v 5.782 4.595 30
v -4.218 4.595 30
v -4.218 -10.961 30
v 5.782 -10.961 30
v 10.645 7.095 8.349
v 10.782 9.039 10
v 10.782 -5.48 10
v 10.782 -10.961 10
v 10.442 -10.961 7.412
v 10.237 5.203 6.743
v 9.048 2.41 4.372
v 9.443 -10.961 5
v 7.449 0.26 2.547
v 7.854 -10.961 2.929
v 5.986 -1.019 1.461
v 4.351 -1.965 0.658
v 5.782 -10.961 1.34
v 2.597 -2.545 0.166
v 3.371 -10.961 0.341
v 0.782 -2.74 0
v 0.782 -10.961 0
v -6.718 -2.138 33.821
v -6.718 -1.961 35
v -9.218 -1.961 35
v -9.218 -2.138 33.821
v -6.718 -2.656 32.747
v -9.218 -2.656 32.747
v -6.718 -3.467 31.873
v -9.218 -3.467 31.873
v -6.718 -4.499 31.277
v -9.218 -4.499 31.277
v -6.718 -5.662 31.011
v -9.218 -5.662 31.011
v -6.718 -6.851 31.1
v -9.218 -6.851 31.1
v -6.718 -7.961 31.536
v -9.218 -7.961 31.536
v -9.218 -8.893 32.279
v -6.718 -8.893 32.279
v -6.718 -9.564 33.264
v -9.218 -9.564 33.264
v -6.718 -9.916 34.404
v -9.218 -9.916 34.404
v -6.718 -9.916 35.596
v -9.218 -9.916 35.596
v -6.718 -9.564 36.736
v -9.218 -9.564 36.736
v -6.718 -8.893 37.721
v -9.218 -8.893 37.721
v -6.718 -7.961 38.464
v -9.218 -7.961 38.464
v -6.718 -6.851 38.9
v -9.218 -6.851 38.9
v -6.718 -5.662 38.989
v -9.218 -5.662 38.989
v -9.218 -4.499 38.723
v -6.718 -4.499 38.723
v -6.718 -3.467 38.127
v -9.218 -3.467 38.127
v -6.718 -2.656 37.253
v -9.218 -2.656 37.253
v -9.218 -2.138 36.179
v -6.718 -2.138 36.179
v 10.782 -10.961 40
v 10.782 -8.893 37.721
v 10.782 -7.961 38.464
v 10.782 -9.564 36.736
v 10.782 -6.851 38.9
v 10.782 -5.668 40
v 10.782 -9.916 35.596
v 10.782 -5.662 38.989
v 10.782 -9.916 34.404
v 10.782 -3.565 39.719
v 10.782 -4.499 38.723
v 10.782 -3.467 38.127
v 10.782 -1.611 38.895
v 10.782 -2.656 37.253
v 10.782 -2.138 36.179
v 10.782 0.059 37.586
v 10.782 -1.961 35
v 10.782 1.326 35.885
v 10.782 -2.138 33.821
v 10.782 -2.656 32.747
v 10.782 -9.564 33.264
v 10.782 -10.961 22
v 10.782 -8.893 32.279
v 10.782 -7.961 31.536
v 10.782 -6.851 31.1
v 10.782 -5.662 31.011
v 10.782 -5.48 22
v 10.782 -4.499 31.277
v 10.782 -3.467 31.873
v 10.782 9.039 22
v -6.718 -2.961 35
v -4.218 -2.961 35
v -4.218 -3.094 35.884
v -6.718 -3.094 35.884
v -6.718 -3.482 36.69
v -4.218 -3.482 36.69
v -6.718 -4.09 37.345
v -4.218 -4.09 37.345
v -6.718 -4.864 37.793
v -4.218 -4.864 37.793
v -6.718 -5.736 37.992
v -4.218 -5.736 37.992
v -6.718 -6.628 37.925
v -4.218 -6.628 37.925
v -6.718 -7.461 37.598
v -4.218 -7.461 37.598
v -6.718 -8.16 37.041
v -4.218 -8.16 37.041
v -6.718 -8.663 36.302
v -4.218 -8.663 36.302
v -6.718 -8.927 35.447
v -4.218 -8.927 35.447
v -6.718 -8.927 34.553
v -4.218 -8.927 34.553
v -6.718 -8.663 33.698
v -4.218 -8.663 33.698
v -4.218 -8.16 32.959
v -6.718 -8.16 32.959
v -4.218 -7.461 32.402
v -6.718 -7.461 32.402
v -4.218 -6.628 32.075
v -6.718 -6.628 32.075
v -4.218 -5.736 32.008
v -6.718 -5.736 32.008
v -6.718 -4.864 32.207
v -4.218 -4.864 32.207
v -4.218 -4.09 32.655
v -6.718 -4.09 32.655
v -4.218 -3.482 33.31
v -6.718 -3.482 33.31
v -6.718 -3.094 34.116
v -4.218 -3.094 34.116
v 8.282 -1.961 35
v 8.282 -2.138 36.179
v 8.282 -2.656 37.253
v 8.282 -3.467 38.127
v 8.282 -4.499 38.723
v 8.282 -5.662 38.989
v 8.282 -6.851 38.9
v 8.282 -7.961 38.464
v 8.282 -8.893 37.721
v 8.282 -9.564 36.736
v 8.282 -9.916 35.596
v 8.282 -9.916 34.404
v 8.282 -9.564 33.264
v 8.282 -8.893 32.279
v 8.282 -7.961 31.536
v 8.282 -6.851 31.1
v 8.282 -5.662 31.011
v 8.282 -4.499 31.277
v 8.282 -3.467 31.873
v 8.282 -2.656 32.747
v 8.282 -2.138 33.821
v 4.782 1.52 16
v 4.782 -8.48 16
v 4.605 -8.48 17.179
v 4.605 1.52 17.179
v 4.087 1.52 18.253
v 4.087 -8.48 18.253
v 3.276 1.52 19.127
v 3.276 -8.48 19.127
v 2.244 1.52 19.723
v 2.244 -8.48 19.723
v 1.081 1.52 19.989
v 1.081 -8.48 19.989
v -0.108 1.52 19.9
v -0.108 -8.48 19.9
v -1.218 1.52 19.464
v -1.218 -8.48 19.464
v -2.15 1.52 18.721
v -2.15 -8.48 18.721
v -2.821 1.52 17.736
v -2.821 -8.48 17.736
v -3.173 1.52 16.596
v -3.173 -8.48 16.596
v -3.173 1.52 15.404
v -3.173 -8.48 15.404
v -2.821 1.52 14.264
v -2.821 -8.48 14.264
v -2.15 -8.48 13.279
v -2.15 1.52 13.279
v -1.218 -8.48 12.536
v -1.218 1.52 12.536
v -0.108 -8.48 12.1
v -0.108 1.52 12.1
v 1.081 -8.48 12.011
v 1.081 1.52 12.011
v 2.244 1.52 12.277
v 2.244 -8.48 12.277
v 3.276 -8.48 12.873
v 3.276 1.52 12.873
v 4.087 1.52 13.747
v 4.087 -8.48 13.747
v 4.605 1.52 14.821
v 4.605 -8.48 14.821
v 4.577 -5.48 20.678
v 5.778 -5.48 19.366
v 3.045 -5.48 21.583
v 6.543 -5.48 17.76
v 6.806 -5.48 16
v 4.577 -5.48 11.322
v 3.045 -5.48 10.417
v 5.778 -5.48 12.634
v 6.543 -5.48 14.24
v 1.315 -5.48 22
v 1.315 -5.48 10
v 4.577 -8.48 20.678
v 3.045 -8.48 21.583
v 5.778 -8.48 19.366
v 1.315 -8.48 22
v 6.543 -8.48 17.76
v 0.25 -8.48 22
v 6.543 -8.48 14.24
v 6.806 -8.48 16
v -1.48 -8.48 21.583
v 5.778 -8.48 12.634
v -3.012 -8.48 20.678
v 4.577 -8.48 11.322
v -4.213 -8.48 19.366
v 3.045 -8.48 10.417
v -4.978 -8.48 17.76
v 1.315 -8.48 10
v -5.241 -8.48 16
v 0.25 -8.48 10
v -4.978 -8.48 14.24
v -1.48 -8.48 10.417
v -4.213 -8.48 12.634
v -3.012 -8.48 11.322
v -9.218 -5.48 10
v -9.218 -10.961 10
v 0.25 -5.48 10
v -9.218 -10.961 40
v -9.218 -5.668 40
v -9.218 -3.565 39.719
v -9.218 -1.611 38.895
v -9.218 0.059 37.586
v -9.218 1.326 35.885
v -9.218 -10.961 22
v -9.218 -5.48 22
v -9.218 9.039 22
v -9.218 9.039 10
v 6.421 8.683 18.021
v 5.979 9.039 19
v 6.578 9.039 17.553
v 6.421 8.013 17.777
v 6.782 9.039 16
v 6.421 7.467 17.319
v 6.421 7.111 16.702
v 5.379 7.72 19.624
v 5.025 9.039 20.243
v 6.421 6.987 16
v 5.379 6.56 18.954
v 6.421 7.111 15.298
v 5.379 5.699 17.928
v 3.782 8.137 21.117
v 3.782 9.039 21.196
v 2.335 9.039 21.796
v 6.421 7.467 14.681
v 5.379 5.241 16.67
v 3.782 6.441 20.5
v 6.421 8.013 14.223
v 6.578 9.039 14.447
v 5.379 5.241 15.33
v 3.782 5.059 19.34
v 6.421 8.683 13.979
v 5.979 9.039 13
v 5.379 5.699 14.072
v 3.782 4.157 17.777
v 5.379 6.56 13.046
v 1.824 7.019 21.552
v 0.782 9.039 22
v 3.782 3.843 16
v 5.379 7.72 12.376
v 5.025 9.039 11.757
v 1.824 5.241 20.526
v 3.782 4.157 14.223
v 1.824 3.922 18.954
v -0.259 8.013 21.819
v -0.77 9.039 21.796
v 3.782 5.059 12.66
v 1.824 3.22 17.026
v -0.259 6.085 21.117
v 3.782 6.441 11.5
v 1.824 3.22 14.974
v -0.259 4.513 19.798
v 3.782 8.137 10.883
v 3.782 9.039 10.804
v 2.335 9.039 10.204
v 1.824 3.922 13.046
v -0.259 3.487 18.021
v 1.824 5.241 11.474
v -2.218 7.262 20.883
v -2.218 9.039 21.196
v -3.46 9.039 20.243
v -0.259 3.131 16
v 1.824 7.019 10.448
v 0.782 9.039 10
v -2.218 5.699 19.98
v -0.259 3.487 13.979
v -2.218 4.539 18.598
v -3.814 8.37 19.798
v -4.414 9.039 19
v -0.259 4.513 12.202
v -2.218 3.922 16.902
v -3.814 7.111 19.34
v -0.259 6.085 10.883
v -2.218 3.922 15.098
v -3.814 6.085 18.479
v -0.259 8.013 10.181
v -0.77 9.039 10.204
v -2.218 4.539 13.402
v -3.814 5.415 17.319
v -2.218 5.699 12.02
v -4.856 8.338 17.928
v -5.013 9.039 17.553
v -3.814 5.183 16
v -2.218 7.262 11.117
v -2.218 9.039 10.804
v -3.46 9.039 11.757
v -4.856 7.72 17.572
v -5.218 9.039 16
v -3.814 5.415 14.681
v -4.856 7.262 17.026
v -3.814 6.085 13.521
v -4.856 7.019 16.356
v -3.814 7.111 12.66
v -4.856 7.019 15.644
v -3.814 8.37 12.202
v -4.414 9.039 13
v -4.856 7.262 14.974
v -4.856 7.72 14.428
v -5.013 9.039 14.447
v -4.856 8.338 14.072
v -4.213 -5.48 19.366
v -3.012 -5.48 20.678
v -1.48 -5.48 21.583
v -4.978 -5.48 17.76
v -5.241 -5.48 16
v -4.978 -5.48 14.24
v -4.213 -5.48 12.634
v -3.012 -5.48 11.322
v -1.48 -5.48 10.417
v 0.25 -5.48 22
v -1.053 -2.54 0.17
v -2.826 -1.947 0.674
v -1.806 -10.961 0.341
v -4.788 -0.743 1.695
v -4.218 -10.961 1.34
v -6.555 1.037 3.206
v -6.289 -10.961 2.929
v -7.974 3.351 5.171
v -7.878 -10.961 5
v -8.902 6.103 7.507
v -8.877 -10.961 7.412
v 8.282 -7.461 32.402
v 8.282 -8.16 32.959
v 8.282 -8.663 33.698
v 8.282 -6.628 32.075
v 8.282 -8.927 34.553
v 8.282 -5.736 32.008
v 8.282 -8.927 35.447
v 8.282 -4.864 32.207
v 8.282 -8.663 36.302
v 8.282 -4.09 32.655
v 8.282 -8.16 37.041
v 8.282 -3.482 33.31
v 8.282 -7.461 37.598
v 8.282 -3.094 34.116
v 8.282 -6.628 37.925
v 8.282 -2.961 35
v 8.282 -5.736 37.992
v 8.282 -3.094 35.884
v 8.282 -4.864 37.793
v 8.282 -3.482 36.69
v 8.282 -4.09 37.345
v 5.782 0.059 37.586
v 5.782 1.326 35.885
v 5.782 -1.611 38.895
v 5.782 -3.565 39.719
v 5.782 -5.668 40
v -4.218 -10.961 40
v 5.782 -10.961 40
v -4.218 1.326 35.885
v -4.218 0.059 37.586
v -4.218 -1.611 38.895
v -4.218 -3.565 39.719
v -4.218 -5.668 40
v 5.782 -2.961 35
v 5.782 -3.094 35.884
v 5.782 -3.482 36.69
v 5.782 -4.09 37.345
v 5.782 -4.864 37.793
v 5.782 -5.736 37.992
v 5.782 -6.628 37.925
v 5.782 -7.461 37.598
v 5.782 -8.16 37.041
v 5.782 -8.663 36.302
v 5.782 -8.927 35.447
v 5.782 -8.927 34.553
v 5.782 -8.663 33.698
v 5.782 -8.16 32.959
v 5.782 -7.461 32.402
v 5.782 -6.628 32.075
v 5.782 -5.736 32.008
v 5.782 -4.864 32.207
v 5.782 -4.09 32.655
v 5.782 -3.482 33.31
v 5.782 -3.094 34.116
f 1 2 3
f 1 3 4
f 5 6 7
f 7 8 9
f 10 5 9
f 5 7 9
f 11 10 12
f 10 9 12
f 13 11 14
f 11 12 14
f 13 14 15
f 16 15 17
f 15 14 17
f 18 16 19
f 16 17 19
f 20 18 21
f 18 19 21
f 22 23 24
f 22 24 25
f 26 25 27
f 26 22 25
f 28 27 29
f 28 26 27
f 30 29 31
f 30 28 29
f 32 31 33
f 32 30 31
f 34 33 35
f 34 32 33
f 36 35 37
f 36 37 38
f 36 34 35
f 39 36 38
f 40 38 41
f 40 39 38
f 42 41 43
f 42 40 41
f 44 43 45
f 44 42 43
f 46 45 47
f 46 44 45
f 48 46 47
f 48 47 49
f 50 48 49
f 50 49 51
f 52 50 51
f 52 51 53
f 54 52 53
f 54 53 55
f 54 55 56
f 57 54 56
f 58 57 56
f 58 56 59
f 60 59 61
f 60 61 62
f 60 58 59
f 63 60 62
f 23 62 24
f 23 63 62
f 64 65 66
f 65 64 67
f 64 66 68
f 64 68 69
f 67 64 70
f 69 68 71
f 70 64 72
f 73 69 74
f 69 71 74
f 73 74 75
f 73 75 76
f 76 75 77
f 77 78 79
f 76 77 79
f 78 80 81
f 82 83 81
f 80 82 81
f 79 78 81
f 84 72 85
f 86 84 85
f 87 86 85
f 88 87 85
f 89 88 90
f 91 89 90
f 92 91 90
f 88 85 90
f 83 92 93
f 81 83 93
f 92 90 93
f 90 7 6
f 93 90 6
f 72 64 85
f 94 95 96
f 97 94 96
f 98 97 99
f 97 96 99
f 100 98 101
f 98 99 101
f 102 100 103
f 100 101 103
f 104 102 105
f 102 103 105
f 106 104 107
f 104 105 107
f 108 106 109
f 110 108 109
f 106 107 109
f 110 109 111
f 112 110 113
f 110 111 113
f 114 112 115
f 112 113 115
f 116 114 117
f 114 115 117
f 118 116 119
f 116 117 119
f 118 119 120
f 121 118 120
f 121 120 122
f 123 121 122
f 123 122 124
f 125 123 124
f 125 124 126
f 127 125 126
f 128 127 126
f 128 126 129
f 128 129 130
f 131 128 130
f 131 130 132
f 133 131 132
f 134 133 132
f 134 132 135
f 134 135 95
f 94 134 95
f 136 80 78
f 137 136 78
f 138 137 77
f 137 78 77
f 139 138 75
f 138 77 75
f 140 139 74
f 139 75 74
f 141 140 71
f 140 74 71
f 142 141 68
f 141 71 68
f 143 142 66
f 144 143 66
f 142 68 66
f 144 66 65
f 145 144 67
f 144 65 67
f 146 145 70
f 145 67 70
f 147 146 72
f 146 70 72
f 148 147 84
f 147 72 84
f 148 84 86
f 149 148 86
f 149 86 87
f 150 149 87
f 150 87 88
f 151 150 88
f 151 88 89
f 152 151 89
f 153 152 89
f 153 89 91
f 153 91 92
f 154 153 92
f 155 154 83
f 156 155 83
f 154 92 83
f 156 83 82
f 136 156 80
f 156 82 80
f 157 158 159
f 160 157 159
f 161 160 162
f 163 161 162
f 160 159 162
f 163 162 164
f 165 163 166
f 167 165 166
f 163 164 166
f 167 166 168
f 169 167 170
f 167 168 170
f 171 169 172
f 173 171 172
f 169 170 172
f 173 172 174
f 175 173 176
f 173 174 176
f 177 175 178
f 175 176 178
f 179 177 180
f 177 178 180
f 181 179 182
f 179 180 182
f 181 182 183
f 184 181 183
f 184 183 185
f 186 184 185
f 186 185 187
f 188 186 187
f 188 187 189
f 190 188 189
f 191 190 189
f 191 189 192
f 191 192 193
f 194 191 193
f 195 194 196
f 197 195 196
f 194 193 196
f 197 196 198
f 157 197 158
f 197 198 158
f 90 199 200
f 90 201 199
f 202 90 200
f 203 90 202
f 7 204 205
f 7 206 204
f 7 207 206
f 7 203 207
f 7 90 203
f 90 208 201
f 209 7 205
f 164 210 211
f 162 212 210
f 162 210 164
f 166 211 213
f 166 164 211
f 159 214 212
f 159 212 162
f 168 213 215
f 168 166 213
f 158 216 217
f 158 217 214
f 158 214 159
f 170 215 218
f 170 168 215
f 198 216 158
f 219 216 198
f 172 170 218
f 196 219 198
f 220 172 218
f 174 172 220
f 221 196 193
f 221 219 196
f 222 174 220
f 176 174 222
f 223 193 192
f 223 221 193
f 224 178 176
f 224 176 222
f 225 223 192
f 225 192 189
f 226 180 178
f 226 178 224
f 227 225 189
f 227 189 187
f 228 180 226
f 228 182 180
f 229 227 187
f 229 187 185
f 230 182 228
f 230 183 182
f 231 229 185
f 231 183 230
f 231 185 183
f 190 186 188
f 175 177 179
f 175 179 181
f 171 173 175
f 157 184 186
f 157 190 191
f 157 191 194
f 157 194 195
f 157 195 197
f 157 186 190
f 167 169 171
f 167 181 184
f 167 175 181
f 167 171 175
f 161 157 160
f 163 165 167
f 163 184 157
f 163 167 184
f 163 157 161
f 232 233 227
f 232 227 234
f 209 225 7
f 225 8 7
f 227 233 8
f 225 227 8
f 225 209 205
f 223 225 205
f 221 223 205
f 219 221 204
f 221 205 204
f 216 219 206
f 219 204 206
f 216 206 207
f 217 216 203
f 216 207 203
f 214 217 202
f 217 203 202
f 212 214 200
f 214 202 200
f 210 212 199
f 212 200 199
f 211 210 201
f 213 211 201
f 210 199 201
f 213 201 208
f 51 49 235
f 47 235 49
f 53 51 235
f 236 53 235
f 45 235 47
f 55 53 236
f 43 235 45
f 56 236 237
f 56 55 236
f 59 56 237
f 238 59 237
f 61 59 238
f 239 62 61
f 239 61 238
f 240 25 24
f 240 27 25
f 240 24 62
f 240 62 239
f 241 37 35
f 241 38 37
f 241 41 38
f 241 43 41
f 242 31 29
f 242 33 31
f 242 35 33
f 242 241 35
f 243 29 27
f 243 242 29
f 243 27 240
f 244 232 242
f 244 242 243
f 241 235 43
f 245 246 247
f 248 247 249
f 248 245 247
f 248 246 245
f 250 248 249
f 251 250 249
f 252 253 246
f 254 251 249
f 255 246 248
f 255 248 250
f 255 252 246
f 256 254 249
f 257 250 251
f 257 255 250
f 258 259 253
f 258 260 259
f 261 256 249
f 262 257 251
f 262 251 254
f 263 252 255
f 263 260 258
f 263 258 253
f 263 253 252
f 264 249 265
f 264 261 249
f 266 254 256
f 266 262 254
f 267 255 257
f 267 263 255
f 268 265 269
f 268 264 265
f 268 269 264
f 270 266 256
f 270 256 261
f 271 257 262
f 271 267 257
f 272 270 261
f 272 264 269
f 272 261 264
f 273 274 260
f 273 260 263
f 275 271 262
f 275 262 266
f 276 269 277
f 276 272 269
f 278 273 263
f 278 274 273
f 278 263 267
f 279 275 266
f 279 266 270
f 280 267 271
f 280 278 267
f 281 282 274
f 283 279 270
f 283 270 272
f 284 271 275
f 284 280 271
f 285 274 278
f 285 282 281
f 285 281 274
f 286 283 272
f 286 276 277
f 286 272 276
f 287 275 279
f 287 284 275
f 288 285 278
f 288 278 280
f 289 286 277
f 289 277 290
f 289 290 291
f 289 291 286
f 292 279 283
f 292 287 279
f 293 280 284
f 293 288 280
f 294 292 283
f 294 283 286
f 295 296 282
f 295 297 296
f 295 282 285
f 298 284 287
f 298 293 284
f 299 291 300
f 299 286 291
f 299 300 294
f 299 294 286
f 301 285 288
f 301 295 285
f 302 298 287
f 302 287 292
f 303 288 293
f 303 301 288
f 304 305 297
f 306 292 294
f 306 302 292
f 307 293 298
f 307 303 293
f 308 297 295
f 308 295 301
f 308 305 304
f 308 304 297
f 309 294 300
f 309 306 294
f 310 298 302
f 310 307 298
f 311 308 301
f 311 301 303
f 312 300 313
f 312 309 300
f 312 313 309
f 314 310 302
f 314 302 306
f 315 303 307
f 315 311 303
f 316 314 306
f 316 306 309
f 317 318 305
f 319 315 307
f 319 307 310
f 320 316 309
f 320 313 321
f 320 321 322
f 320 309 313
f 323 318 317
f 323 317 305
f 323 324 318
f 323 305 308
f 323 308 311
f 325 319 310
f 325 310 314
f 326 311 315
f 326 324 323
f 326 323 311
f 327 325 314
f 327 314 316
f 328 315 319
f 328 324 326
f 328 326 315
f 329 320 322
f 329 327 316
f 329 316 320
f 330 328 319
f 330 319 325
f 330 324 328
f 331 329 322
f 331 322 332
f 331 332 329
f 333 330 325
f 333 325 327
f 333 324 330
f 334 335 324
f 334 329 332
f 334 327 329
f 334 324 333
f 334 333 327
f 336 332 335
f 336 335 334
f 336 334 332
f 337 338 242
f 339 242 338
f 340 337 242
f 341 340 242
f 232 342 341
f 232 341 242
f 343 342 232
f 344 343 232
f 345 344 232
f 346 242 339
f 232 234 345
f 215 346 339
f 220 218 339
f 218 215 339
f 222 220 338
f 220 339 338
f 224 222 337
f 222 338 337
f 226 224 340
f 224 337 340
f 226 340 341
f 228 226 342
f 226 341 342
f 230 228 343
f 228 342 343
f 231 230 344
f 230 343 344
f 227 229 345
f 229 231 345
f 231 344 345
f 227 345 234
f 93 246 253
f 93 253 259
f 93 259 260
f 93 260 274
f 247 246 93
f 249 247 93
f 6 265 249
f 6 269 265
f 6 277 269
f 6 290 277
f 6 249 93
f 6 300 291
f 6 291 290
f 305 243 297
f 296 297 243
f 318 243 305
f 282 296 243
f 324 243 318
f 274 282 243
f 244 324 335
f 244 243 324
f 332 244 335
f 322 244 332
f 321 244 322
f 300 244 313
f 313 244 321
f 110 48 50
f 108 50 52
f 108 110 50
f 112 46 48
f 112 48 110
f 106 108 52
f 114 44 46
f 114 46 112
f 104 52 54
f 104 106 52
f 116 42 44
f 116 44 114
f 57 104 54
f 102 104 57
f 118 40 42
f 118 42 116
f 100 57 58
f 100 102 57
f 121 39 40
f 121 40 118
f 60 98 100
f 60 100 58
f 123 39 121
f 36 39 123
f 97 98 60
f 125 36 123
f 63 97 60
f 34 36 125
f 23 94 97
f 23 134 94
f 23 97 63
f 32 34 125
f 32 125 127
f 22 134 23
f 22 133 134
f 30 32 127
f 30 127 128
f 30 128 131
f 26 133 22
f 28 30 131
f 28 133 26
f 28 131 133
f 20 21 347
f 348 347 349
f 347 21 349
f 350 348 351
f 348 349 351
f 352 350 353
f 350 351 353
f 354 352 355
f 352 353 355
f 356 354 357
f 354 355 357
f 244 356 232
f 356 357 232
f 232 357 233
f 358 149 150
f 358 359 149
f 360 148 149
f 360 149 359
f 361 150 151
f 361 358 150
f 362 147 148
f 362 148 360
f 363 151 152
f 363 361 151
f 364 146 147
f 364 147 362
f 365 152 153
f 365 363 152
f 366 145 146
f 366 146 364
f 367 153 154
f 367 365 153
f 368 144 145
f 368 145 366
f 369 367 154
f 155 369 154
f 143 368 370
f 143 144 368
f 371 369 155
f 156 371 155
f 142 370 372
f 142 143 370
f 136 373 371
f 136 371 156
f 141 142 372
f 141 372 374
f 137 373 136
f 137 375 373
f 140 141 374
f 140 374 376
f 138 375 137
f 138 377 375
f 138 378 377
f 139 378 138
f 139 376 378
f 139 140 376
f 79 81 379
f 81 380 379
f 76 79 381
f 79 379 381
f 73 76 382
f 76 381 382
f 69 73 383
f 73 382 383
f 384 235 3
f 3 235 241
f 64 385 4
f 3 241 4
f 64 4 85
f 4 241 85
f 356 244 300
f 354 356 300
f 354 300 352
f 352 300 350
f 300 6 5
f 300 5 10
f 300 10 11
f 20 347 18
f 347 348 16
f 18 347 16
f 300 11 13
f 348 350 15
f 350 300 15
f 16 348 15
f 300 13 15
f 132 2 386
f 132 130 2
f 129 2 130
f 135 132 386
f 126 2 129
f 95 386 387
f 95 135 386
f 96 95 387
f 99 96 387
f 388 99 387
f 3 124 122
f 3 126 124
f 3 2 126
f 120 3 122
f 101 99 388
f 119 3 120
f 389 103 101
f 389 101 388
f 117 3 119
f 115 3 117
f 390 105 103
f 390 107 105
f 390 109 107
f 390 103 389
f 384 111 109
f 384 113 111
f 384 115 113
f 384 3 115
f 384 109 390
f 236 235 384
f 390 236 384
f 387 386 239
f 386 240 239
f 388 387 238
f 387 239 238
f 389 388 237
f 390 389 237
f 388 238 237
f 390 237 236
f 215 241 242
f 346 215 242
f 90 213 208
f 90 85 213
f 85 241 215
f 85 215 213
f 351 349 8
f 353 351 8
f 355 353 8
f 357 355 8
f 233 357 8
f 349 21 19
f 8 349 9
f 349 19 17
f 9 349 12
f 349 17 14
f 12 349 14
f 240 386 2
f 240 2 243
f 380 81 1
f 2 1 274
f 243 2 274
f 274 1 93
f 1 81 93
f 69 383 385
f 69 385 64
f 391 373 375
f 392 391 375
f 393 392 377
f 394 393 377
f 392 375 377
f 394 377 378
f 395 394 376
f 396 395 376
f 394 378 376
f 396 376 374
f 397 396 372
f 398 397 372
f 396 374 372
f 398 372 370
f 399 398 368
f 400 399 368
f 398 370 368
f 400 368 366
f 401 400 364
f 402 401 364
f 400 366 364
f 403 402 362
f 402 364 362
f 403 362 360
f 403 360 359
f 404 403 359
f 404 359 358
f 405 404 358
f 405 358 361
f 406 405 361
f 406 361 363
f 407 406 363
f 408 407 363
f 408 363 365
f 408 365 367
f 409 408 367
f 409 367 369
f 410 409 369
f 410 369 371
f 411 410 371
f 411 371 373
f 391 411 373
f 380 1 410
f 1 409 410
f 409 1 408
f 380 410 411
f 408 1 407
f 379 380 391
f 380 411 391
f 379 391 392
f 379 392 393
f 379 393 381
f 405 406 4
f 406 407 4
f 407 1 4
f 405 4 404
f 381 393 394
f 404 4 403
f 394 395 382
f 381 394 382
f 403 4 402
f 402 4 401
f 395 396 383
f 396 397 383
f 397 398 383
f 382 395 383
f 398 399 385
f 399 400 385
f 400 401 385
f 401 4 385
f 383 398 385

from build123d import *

# Parameters (mm, degrees)
SKETCH5_W           = 20
SKETCH5_H           = 20
BOSS_EXTRUDE1_DEPTH = 40
SKETCH7_W           = 12
SKETCH7_H           = 5.480254557
CUT_EXTRUDE3_DEPTH  = 20
SKETCH8_W           = 10
SKETCH8_H           = 10
CUT_EXTRUDE5_DEPTH  = 20
SKETCH12_R          = 3
CUT_EXTRUDE9_DEPTH  = 20
SKETCH16_R          = 4
CUT_EXTRUDE10_DEPTH = 2.5
CUT_EXTRUDE11_START = -2.5
SKETCH17_R          = 4
CUT_EXTRUDE11_DEPTH = 2.5
FILLET8_R           = 8
SKETCH18_R          = 6.023611462
BOSS_EXTRUDE2_DEPTH = 3
SKETCH19_R          = 4
CUT_EXTRUDE12_DEPTH = 10


with BuildPart() as part:
    # Sketch5 → Boss-Extrude1 (new body)
    with BuildSketch(Plane.XY):
        with Locations((0.782482396, -0.960509114)):
            Rectangle(SKETCH5_W, SKETCH5_H)
    extrude(amount=BOSS_EXTRUDE1_DEPTH)

    # Sketch7 → Cut-Extrude3 (cut)
    with BuildSketch(Plane(origin=(10.782482396, 0, 0), x_dir=(0, 0, -1), z_dir=(1, 0, 0))):
        Polygon((-40, 9.039490886), (-40, -0.960509114), (-22, 9.039490886), align=None)
        with Locations((-16, -8.220381835)):
            Rectangle(SKETCH7_W, SKETCH7_H)
        Polygon((-10, 9.039490886), (0, -2.740127279), (0, 9.039490886), align=None)
    extrude(amount=-CUT_EXTRUDE3_DEPTH, mode=Mode.SUBTRACT)

    # Sketch8 → Cut-Extrude5 (cut)
    with BuildSketch(Plane.XZ.offset(10.960509114)):
        with BuildLine():
            Line((-9.217517604, 0), (0.78248238, 0))
            ThreePointArc((0.78248238, 0), (-6.288585421, 2.928932194), (-9.217517604, 10))
            Line((-9.217517604, 10), (-9.217517604, 0))
        make_face()
        with BuildLine():
            Line((10.782482396, 0), (10.782482396, 10))
            ThreePointArc((10.782482396, 10), (7.853550202, 2.928932182), (0.78248238, 0))
            Line((0.78248238, 0), (10.782482396, 0))
        make_face()
        with Locations((0.782482396, 35)):
            Rectangle(SKETCH8_W, SKETCH8_H)
    extrude(amount=-CUT_EXTRUDE5_DEPTH, mode=Mode.SUBTRACT)

    # Sketch10 → Cut-Revolve2 (revolve, cut)
    with BuildSketch(Plane(origin=(0, 9.039490886, 0), x_dir=(1, 0, 0), z_dir=(0, 1, 0))):
        with BuildLine():
            Line((-5.217517604, -16), (6.782482396, -16))
            ThreePointArc((6.782482396, -16), (0.782482396, -22), (-5.217517604, -16))
        make_face()
    revolve(axis=Axis((-5.217517604, 9.039490886, 16), (1, 0, 0)), mode=Mode.SUBTRACT)

    # Sketch12 → Cut-Extrude9 (cut)
    with BuildSketch(Plane(origin=(10.782482396, 0, 0), x_dir=(0, 0, -1), z_dir=(1, 0, 0))):
        with Locations(Location((-35, -5.960509114, 0), (0, 0, 90))):
            Circle(SKETCH12_R)
    extrude(amount=-CUT_EXTRUDE9_DEPTH, mode=Mode.SUBTRACT)

    # Sketch16 → Cut-Extrude10 (cut)
    with BuildSketch(Plane(origin=(10.782482396, 0, 0), x_dir=(0, 0, -1), z_dir=(1, 0, 0))):
        with Locations(Location((-35, -5.960509114, 0), (0, 0, 90))):
            Circle(SKETCH16_R)
    extrude(amount=-CUT_EXTRUDE10_DEPTH, mode=Mode.SUBTRACT)

    # Sketch17 → Cut-Extrude11 (cut)
    with BuildSketch(Plane.ZY.offset(9.217517604).offset(CUT_EXTRUDE11_START)):
        with Locations(Location((35, -5.960509114, 0), (0, 0, 90))):
            Circle(SKETCH17_R)
    extrude(amount=CUT_EXTRUDE11_DEPTH, mode=Mode.SUBTRACT)

    # Fillet8
    fillet8_edges = [part.edges().sort_by_distance(p)[0] for p in [
        (-6.717517604, -0.960509114, 40),
        (8.282482396, -0.960509114, 40),
    ]]
    fillet(fillet8_edges, radius=FILLET8_R)

    # Sketch18 → Boss-Extrude2 (add)
    with BuildSketch(Plane(origin=(0, -5.480254557, 0), x_dir=(-1, 0, 0), z_dir=(0, -1, 0))):
        with Locations((-0.782482396, -16)):
            Circle(SKETCH18_R)
    extrude(amount=BOSS_EXTRUDE2_DEPTH)

    # Sketch19 → Cut-Extrude12 (cut)
    with BuildSketch(Plane(origin=(0, -8.480254557, 0), x_dir=(-1, 0, 0), z_dir=(0, -1, 0))):
        with Locations(Location((-0.782482396, -16, 0), (0, 0, 180))):
            Circle(SKETCH19_R)
    extrude(amount=-CUT_EXTRUDE12_DEPTH, mode=Mode.SUBTRACT)


solid = part.part
